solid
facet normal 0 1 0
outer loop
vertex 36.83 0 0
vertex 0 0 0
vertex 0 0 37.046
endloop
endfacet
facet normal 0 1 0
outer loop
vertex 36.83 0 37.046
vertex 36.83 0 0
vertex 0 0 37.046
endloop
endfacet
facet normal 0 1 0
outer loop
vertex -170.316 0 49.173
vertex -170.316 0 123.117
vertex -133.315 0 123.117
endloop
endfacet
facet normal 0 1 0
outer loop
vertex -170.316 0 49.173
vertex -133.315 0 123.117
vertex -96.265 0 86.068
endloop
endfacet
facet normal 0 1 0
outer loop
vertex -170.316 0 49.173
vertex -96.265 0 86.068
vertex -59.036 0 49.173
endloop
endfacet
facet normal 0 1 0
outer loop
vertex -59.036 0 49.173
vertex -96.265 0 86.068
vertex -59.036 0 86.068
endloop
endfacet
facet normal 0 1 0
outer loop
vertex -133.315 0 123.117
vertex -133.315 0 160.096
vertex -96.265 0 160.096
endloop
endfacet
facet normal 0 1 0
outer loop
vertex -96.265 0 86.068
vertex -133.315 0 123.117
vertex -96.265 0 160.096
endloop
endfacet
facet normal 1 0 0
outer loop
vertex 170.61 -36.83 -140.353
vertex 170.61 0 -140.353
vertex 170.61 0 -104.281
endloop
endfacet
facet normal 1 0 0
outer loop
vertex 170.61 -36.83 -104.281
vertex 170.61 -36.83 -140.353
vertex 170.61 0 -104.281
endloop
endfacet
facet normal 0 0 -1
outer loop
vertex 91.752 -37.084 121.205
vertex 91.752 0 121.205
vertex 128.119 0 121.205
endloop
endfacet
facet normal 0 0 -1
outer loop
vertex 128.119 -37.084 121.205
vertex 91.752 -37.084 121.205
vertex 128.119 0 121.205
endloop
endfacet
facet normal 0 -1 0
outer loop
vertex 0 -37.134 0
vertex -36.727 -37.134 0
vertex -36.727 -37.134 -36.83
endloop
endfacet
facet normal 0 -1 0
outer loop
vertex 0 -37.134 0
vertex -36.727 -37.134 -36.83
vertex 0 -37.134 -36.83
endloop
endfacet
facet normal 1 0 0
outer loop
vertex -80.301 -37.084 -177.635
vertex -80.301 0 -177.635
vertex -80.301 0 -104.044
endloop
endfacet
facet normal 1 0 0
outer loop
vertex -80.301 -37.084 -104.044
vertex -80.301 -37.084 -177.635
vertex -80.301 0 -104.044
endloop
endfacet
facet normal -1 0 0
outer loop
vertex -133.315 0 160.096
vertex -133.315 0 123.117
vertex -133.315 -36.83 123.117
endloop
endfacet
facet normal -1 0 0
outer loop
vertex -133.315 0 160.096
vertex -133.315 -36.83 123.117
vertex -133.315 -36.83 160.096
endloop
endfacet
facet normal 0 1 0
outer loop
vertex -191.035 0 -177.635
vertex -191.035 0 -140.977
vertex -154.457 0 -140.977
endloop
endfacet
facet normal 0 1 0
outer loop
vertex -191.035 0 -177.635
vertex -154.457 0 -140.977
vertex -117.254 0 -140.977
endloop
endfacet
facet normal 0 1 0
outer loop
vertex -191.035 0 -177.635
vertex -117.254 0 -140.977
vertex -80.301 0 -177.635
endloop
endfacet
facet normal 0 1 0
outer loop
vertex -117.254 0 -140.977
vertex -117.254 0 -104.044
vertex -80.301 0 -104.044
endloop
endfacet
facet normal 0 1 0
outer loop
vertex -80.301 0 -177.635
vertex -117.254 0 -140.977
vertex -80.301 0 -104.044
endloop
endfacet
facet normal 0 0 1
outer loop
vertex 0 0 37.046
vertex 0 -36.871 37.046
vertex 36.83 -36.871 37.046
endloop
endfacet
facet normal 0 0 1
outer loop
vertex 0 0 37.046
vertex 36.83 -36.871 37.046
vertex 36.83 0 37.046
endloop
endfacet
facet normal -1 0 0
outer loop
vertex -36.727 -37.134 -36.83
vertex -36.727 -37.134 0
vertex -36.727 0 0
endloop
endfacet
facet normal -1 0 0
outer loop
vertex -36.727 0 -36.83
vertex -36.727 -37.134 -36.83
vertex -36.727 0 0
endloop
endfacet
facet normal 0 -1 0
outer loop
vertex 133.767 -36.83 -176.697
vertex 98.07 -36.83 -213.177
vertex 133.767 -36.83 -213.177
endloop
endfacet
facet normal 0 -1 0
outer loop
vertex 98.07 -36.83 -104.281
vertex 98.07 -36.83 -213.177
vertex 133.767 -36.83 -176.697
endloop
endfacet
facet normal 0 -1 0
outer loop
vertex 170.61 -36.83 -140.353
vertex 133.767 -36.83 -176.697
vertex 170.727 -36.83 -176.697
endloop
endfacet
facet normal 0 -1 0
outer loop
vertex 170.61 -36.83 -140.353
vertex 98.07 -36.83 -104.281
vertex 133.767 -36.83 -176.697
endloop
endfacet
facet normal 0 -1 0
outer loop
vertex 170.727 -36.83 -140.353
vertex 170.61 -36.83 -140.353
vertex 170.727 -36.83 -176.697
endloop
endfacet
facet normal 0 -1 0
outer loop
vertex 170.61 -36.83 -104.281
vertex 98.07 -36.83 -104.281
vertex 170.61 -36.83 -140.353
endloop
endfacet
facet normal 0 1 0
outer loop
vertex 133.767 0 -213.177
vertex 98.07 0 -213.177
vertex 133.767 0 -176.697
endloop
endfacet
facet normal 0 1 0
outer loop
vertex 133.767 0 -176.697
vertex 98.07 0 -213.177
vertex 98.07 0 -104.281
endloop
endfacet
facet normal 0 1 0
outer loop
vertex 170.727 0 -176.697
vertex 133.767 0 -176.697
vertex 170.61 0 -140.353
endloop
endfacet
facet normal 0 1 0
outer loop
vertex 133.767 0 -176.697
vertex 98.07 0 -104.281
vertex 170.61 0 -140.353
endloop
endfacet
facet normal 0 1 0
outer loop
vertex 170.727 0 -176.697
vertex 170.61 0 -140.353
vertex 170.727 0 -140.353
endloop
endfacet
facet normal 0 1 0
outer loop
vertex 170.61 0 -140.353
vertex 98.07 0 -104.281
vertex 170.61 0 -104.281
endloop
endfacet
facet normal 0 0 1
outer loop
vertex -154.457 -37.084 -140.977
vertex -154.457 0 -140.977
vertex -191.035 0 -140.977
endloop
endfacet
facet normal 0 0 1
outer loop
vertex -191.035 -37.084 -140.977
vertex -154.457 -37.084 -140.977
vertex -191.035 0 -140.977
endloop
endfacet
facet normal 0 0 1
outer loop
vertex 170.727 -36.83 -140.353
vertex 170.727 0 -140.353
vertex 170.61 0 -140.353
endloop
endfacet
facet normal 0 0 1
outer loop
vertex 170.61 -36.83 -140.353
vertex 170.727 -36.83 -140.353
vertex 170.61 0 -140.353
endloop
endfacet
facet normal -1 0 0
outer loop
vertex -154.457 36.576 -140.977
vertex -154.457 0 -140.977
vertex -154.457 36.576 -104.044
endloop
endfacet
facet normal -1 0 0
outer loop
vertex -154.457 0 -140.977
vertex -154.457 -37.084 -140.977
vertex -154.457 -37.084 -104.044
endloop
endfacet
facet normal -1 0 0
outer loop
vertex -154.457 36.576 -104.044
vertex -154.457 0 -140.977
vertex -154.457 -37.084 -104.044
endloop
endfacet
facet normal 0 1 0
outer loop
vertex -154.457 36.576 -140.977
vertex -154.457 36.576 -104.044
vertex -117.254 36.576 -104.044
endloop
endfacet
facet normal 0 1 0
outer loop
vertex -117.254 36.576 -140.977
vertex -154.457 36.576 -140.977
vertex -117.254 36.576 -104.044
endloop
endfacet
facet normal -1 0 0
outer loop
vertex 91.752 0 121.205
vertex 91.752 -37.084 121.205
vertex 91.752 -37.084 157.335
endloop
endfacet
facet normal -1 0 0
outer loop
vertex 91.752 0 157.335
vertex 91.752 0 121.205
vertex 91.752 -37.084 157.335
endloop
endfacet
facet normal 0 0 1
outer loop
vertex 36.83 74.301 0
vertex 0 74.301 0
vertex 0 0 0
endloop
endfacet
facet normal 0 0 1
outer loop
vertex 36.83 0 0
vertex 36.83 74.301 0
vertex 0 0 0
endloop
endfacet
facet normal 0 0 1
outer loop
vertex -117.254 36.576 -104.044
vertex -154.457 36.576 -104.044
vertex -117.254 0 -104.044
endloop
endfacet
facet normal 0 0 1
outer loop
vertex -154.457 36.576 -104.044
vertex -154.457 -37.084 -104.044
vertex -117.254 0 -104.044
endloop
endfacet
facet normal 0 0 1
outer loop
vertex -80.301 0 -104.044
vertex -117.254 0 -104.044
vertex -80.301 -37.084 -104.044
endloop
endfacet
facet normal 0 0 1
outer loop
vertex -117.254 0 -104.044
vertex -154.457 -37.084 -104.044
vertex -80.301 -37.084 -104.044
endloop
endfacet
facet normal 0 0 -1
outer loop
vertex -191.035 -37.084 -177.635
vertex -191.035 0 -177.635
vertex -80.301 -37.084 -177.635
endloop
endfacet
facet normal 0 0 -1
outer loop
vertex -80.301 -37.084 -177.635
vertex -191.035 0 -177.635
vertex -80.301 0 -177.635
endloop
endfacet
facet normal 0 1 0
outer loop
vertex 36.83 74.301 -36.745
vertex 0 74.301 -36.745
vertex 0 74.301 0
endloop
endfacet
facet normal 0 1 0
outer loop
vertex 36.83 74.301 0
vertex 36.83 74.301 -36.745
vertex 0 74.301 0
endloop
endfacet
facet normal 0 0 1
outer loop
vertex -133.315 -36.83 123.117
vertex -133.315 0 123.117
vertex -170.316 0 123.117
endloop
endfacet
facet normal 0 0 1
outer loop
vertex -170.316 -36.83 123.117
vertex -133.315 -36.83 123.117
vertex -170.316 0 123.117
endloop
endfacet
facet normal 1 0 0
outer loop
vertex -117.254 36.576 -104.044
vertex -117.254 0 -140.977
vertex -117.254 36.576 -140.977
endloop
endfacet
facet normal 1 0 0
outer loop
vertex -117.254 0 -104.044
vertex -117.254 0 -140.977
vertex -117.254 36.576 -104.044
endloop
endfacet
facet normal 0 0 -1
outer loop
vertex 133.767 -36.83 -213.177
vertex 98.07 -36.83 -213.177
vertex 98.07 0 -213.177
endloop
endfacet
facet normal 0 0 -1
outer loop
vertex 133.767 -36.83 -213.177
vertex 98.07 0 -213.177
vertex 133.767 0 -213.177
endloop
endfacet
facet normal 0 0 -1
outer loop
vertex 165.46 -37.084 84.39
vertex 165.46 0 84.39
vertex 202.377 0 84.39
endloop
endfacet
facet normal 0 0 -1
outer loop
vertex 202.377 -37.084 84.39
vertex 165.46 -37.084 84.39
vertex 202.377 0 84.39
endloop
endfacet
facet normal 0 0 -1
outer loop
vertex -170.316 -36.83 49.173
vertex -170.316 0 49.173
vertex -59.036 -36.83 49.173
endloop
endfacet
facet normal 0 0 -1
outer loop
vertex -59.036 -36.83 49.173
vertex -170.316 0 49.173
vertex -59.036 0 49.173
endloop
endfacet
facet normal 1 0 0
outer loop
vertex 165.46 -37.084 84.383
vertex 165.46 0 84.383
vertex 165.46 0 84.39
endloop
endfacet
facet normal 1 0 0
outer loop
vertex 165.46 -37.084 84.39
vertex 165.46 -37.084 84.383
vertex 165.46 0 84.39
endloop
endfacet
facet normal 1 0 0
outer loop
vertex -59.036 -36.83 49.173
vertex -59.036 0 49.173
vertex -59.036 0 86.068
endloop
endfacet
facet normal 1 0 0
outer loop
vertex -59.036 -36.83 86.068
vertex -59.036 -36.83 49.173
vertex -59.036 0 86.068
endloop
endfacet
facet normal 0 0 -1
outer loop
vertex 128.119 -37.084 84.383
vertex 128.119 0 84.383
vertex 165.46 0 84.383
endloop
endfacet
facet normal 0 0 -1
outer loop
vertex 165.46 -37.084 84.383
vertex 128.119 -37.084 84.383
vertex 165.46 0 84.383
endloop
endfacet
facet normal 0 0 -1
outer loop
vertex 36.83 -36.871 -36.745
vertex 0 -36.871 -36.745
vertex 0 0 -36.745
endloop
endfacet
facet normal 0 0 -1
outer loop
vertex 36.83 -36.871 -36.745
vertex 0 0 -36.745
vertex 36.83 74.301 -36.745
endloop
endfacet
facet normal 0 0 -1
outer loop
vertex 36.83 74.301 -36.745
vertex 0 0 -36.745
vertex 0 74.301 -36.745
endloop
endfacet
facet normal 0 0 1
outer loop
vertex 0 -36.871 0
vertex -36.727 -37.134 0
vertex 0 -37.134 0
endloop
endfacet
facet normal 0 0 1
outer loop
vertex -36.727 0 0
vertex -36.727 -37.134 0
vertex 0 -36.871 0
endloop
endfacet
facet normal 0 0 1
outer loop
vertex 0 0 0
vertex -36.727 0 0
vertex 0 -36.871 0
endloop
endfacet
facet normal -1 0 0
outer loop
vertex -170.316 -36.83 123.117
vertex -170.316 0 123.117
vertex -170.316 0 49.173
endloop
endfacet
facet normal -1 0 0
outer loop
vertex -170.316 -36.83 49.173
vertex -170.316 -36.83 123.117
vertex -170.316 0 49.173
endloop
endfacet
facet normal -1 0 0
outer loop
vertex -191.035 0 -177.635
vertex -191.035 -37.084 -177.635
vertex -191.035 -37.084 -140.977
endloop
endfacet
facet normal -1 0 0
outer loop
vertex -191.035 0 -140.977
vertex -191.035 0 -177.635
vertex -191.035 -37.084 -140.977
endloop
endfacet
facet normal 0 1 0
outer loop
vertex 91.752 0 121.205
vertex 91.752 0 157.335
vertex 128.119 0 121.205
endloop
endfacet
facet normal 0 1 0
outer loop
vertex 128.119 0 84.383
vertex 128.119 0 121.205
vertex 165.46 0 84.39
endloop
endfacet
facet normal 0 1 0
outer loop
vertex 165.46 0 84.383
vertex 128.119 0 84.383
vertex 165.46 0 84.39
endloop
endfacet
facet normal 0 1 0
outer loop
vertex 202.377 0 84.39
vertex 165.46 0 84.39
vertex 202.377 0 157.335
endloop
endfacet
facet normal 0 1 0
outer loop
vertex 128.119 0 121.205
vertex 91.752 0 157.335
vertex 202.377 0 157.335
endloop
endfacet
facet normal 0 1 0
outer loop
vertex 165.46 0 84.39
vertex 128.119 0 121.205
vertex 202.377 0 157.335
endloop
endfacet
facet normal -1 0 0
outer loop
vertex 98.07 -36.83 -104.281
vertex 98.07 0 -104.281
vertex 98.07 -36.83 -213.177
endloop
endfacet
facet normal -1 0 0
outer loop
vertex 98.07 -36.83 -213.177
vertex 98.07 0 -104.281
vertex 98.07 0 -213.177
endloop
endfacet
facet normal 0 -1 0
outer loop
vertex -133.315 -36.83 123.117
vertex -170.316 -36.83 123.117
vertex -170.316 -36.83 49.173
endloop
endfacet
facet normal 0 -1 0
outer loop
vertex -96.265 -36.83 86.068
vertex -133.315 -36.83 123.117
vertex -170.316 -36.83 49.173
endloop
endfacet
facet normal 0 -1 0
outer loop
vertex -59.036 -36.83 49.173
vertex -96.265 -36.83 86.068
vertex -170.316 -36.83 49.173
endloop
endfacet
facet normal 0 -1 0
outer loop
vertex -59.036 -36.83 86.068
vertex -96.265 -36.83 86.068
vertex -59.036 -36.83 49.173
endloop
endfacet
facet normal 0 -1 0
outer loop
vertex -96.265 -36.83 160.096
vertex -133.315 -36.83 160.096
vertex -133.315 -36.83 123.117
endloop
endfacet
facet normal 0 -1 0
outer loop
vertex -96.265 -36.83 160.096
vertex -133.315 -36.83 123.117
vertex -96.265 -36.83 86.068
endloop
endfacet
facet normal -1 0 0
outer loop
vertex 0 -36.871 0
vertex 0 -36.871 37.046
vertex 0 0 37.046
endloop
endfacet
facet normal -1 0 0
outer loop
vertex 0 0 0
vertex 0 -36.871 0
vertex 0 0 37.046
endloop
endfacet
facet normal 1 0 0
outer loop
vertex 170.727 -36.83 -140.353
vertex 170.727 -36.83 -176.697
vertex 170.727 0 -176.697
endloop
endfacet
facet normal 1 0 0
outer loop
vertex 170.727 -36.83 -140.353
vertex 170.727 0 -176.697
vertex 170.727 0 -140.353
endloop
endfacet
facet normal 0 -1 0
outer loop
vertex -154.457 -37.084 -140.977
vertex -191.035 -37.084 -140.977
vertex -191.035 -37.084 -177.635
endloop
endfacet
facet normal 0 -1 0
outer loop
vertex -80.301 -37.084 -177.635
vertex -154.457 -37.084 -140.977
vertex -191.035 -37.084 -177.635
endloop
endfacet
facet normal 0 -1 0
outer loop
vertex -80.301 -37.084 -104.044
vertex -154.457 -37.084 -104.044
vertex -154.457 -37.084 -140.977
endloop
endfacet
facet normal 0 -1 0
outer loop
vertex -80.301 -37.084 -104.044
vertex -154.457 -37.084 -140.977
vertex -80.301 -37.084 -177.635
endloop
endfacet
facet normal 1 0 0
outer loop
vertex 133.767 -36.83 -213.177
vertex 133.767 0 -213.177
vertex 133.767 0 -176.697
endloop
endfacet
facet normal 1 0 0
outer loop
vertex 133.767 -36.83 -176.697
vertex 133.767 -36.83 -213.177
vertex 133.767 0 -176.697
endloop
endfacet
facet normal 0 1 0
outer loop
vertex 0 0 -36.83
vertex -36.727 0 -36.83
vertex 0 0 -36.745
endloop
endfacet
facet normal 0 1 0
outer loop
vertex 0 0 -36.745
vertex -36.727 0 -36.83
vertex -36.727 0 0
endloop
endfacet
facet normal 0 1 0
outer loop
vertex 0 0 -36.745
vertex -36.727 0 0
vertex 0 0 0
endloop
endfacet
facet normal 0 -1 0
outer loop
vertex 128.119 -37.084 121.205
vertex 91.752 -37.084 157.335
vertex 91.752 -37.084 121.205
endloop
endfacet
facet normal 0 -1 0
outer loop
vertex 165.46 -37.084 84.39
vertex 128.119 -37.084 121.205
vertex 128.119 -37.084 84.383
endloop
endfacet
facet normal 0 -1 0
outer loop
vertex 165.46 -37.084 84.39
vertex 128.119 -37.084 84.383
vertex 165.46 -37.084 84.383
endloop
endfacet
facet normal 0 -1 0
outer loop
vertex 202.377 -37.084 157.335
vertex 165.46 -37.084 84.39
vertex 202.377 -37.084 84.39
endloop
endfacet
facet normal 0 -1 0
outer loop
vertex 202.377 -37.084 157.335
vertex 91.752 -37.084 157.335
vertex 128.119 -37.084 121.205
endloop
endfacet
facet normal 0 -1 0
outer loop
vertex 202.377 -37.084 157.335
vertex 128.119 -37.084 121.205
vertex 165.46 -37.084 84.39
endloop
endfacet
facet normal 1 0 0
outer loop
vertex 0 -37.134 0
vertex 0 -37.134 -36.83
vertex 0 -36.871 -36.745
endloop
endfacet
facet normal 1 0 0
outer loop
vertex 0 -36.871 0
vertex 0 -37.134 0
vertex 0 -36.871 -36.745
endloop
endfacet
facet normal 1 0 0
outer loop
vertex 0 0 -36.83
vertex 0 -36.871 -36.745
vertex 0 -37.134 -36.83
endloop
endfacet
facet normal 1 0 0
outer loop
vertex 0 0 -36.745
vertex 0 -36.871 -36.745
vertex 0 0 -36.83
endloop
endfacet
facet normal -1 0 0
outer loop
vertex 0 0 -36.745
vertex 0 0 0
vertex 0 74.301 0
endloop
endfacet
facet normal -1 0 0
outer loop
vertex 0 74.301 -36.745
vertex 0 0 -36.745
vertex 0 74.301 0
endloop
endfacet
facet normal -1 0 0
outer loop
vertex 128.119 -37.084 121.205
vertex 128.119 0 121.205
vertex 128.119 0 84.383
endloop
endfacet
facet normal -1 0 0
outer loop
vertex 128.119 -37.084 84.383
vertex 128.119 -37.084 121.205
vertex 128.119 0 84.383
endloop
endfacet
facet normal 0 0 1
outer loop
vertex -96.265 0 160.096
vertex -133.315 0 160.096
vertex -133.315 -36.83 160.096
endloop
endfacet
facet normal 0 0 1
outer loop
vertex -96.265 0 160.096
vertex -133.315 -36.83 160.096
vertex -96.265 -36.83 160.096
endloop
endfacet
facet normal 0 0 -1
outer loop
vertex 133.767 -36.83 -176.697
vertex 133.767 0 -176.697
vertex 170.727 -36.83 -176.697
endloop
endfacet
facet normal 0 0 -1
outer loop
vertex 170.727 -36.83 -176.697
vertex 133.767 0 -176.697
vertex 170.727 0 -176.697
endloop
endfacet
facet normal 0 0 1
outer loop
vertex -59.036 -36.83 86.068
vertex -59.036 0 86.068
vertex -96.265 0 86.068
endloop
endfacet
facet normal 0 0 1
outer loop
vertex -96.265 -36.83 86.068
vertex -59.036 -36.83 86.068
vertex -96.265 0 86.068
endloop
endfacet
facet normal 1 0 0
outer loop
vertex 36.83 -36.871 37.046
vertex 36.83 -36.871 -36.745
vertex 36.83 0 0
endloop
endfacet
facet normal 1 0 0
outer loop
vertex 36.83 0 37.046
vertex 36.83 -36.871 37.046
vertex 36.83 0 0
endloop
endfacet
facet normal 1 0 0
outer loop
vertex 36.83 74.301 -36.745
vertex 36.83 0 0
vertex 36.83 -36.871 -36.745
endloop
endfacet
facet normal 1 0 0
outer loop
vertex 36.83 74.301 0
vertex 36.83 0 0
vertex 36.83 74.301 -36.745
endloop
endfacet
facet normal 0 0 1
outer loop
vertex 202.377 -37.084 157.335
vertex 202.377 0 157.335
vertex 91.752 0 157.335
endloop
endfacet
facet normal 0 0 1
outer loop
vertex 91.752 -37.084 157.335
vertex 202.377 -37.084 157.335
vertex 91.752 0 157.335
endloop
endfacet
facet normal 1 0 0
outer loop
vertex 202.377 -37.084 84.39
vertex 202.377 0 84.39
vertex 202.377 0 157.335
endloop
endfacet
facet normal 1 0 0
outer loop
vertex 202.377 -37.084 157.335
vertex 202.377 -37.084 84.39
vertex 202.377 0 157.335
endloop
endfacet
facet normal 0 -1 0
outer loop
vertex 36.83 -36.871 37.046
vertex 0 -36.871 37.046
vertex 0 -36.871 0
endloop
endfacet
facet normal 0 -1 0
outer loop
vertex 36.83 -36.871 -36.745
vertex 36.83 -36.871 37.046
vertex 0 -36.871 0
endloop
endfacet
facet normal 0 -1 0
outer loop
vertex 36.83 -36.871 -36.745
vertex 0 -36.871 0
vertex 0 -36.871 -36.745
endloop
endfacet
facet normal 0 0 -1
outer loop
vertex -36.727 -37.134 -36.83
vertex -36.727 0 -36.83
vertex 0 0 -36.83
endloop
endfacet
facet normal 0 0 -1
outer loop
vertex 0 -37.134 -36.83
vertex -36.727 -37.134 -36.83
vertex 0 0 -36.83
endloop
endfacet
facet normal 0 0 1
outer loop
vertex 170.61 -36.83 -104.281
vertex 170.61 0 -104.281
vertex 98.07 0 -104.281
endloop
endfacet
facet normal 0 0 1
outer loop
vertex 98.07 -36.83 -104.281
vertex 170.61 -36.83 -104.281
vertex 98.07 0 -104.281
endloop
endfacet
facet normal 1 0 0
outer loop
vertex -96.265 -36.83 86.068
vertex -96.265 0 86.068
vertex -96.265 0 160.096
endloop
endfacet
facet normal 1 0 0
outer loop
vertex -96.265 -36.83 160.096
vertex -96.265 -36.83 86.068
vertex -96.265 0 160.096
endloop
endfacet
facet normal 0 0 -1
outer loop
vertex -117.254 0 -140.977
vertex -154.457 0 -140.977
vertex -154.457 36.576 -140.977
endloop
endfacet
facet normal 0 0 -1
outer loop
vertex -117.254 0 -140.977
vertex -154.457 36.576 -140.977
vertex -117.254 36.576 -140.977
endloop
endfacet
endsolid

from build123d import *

# Parameters (mm, degrees)
F0_W      = 36.8707999587
F0_H      = 37.0462089777
F0_H_2    = 36.7453359067
F0_W_2    = 37.4526120722
F0_W_3    = 36.8483401835
F1_DEPTH  = 36.83
F2_W      = 36.7274060845
F2_H      = 37.1338948607
F3_DEPTH  = 36.83
F4_W      = 36.3674685359
F4_H      = 36.1300632358
F4_W_2    = 37.3409986496
F4_W_3    = 36.9172394276
F4_H_2    = 0.1472309232
F4_H_3    = 36.6679653525
F5_DEPTH  = 37.084
F6_W      = 36.8429273367
F6_H      = 36.0713973641
F6_W_2    = 35.6973931193
F6_H_2    = 36.3366901875
F6_H_3    = 36.4796817303
F7_DEPTH  = 36.83
F8_W      = 37.0499566197
F8_H      = 36.895506084
F8_W_2    = 37.0007306337
F8_W_3    = 37.2293926775
F8_H_2    = 37.0487198234
F8_H_3    = 36.979354918
F9_DEPTH  = 36.83
F10_W     = 37.2024774551
F10_H     = 36.6578996181
F10_W_2   = 36.5787893534
F10_W_3   = 36.9535088539
F10_H_2   = 36.9332283735
F11_DEPTH = 37.084
F12_DEPTH = 36.576


with BuildPart() as f1:
    # F0 (on Right) → F1 (new body)
    with BuildSketch(Plane.YZ):
        with Locations((-18.4353999794, 18.5231044888)):
            Rectangle(F0_W, F0_H)
        with Locations((-18.4353999794, -18.3726679534)):
            Rectangle(F0_W, F0_H_2)
        with Locations((18.7263060361, -18.3726679534)):
            Rectangle(F0_W_2, F0_H_2)
        with Locations((55.876782164, -18.3726679534)):
            Rectangle(F0_W_3, F0_H_2)
    extrude(amount=F1_DEPTH)

    # F2 (on Top) → F3 (join)
    with BuildSketch(Plane.XY):
        with Locations((-18.3637030423, -18.5669474304)):
            Rectangle(F2_W, F2_H)
    extrude(amount=-F3_DEPTH)


with BuildPart() as f5:
    # F4 (on Front) → F5 (new body)
    with BuildSketch(Plane.XZ):
        with Locations((109.935361892, 139.2699815333)):
            Rectangle(F4_W, F4_H)
        with Locations((146.7895954847, 139.2699815333)):
            Rectangle(F4_W_2, F4_H)
        Polygon((165.4600948095, 121.2049499154), (128.1190961599, 121.2049499154), (128.1190961599, 84.3831375241), (165.4600948095, 84.3831375241), (165.4600948095, 84.3897536397), (165.4600948095, 121.0577189922), align=None)
        with Locations((183.9187145233, 139.2699815333)):
            Rectangle(F4_W_3, F4_H)
        with Locations((183.9187145233, 121.1313344538)):
            Rectangle(F4_W_3, F4_H_2)
        with Locations((183.9187145233, 102.723736316)):
            Rectangle(F4_W_3, F4_H_3)
    extrude(amount=F5_DEPTH)


with BuildPart() as f7:
    # F6 (on Front) → F7 (new body)
    with BuildSketch(Plane.XZ):
        with Locations((152.1887555718, -122.3171167076)):
            Rectangle(F6_W, F6_H)
        Polygon((133.7672919035, -140.3528153896), (133.7672919035, -104.2814180255), (98.0698987842, -104.2814180255), (98.0698987842, -140.3603851795), (133.7672919035, -140.3603851795), align=None)
        Polygon((170.7268208265, -140.3528153896), (170.6102192402, -140.3528153896), (133.7672919035, -140.3528153896), (133.7672919035, -140.3603851795), (133.7672919035, -176.697075367), (170.7268208265, -176.697075367), align=None)
        with Locations((115.9185953438, -158.5287302732)):
            Rectangle(F6_W_2, F6_H_2)
        with Locations((115.9185953438, -194.9369162321)):
            Rectangle(F6_W_2, F6_H_3)
    extrude(amount=F7_DEPTH)


with BuildPart() as f9:
    # F8 (on Front) → F9 (new body)
    with BuildSketch(Plane.XZ):
        with Locations((-114.7904209793, 67.6203854382)):
            Rectangle(F8_W, F8_H)
        with Locations((-151.815764606, 67.6203854382)):
            Rectangle(F8_W_2, F8_H)
        with Locations((-77.6507463306, 67.6203854382)):
            Rectangle(F8_W_3, F8_H)
        with Locations((-114.7904209793, 104.5924983919)):
            Rectangle(F8_W, F8_H_2)
        with Locations((-151.815764606, 104.5924983919)):
            Rectangle(F8_W_2, F8_H_2)
        with Locations((-114.7904209793, 141.6065357625)):
            Rectangle(F8_W, F8_H_3)
    extrude(amount=F9_DEPTH)


with BuildPart() as f11:
    # F10 (on Front) → F11 (new body)
    with BuildSketch(Plane.XZ):
        with Locations((-135.8552724123, -159.3060791492)):
            Rectangle(F10_W, F10_H)
        with Locations((-172.7459058166, -159.3060791492)):
            Rectangle(F10_W_2, F10_H)
        with Locations((-98.7772792578, -159.3060791492)):
            Rectangle(F10_W_3, F10_H)
        with Locations((-135.8552724123, -122.5105151534)):
            Rectangle(F10_W, F10_H_2)
        with Locations((-98.7772792578, -122.5105151534)):
            Rectangle(F10_W_3, F10_H_2)
    extrude(amount=F11_DEPTH)

    # F10 (on Front) → F12 (join)
    with BuildSketch(Plane.XZ):
        with Locations((-135.8552724123, -122.5105151534)):
            Rectangle(F10_W, F10_H_2)
    extrude(amount=-F12_DEPTH)


solid = Compound([f1.part, f5.part, f7.part, f9.part, f11.part])
